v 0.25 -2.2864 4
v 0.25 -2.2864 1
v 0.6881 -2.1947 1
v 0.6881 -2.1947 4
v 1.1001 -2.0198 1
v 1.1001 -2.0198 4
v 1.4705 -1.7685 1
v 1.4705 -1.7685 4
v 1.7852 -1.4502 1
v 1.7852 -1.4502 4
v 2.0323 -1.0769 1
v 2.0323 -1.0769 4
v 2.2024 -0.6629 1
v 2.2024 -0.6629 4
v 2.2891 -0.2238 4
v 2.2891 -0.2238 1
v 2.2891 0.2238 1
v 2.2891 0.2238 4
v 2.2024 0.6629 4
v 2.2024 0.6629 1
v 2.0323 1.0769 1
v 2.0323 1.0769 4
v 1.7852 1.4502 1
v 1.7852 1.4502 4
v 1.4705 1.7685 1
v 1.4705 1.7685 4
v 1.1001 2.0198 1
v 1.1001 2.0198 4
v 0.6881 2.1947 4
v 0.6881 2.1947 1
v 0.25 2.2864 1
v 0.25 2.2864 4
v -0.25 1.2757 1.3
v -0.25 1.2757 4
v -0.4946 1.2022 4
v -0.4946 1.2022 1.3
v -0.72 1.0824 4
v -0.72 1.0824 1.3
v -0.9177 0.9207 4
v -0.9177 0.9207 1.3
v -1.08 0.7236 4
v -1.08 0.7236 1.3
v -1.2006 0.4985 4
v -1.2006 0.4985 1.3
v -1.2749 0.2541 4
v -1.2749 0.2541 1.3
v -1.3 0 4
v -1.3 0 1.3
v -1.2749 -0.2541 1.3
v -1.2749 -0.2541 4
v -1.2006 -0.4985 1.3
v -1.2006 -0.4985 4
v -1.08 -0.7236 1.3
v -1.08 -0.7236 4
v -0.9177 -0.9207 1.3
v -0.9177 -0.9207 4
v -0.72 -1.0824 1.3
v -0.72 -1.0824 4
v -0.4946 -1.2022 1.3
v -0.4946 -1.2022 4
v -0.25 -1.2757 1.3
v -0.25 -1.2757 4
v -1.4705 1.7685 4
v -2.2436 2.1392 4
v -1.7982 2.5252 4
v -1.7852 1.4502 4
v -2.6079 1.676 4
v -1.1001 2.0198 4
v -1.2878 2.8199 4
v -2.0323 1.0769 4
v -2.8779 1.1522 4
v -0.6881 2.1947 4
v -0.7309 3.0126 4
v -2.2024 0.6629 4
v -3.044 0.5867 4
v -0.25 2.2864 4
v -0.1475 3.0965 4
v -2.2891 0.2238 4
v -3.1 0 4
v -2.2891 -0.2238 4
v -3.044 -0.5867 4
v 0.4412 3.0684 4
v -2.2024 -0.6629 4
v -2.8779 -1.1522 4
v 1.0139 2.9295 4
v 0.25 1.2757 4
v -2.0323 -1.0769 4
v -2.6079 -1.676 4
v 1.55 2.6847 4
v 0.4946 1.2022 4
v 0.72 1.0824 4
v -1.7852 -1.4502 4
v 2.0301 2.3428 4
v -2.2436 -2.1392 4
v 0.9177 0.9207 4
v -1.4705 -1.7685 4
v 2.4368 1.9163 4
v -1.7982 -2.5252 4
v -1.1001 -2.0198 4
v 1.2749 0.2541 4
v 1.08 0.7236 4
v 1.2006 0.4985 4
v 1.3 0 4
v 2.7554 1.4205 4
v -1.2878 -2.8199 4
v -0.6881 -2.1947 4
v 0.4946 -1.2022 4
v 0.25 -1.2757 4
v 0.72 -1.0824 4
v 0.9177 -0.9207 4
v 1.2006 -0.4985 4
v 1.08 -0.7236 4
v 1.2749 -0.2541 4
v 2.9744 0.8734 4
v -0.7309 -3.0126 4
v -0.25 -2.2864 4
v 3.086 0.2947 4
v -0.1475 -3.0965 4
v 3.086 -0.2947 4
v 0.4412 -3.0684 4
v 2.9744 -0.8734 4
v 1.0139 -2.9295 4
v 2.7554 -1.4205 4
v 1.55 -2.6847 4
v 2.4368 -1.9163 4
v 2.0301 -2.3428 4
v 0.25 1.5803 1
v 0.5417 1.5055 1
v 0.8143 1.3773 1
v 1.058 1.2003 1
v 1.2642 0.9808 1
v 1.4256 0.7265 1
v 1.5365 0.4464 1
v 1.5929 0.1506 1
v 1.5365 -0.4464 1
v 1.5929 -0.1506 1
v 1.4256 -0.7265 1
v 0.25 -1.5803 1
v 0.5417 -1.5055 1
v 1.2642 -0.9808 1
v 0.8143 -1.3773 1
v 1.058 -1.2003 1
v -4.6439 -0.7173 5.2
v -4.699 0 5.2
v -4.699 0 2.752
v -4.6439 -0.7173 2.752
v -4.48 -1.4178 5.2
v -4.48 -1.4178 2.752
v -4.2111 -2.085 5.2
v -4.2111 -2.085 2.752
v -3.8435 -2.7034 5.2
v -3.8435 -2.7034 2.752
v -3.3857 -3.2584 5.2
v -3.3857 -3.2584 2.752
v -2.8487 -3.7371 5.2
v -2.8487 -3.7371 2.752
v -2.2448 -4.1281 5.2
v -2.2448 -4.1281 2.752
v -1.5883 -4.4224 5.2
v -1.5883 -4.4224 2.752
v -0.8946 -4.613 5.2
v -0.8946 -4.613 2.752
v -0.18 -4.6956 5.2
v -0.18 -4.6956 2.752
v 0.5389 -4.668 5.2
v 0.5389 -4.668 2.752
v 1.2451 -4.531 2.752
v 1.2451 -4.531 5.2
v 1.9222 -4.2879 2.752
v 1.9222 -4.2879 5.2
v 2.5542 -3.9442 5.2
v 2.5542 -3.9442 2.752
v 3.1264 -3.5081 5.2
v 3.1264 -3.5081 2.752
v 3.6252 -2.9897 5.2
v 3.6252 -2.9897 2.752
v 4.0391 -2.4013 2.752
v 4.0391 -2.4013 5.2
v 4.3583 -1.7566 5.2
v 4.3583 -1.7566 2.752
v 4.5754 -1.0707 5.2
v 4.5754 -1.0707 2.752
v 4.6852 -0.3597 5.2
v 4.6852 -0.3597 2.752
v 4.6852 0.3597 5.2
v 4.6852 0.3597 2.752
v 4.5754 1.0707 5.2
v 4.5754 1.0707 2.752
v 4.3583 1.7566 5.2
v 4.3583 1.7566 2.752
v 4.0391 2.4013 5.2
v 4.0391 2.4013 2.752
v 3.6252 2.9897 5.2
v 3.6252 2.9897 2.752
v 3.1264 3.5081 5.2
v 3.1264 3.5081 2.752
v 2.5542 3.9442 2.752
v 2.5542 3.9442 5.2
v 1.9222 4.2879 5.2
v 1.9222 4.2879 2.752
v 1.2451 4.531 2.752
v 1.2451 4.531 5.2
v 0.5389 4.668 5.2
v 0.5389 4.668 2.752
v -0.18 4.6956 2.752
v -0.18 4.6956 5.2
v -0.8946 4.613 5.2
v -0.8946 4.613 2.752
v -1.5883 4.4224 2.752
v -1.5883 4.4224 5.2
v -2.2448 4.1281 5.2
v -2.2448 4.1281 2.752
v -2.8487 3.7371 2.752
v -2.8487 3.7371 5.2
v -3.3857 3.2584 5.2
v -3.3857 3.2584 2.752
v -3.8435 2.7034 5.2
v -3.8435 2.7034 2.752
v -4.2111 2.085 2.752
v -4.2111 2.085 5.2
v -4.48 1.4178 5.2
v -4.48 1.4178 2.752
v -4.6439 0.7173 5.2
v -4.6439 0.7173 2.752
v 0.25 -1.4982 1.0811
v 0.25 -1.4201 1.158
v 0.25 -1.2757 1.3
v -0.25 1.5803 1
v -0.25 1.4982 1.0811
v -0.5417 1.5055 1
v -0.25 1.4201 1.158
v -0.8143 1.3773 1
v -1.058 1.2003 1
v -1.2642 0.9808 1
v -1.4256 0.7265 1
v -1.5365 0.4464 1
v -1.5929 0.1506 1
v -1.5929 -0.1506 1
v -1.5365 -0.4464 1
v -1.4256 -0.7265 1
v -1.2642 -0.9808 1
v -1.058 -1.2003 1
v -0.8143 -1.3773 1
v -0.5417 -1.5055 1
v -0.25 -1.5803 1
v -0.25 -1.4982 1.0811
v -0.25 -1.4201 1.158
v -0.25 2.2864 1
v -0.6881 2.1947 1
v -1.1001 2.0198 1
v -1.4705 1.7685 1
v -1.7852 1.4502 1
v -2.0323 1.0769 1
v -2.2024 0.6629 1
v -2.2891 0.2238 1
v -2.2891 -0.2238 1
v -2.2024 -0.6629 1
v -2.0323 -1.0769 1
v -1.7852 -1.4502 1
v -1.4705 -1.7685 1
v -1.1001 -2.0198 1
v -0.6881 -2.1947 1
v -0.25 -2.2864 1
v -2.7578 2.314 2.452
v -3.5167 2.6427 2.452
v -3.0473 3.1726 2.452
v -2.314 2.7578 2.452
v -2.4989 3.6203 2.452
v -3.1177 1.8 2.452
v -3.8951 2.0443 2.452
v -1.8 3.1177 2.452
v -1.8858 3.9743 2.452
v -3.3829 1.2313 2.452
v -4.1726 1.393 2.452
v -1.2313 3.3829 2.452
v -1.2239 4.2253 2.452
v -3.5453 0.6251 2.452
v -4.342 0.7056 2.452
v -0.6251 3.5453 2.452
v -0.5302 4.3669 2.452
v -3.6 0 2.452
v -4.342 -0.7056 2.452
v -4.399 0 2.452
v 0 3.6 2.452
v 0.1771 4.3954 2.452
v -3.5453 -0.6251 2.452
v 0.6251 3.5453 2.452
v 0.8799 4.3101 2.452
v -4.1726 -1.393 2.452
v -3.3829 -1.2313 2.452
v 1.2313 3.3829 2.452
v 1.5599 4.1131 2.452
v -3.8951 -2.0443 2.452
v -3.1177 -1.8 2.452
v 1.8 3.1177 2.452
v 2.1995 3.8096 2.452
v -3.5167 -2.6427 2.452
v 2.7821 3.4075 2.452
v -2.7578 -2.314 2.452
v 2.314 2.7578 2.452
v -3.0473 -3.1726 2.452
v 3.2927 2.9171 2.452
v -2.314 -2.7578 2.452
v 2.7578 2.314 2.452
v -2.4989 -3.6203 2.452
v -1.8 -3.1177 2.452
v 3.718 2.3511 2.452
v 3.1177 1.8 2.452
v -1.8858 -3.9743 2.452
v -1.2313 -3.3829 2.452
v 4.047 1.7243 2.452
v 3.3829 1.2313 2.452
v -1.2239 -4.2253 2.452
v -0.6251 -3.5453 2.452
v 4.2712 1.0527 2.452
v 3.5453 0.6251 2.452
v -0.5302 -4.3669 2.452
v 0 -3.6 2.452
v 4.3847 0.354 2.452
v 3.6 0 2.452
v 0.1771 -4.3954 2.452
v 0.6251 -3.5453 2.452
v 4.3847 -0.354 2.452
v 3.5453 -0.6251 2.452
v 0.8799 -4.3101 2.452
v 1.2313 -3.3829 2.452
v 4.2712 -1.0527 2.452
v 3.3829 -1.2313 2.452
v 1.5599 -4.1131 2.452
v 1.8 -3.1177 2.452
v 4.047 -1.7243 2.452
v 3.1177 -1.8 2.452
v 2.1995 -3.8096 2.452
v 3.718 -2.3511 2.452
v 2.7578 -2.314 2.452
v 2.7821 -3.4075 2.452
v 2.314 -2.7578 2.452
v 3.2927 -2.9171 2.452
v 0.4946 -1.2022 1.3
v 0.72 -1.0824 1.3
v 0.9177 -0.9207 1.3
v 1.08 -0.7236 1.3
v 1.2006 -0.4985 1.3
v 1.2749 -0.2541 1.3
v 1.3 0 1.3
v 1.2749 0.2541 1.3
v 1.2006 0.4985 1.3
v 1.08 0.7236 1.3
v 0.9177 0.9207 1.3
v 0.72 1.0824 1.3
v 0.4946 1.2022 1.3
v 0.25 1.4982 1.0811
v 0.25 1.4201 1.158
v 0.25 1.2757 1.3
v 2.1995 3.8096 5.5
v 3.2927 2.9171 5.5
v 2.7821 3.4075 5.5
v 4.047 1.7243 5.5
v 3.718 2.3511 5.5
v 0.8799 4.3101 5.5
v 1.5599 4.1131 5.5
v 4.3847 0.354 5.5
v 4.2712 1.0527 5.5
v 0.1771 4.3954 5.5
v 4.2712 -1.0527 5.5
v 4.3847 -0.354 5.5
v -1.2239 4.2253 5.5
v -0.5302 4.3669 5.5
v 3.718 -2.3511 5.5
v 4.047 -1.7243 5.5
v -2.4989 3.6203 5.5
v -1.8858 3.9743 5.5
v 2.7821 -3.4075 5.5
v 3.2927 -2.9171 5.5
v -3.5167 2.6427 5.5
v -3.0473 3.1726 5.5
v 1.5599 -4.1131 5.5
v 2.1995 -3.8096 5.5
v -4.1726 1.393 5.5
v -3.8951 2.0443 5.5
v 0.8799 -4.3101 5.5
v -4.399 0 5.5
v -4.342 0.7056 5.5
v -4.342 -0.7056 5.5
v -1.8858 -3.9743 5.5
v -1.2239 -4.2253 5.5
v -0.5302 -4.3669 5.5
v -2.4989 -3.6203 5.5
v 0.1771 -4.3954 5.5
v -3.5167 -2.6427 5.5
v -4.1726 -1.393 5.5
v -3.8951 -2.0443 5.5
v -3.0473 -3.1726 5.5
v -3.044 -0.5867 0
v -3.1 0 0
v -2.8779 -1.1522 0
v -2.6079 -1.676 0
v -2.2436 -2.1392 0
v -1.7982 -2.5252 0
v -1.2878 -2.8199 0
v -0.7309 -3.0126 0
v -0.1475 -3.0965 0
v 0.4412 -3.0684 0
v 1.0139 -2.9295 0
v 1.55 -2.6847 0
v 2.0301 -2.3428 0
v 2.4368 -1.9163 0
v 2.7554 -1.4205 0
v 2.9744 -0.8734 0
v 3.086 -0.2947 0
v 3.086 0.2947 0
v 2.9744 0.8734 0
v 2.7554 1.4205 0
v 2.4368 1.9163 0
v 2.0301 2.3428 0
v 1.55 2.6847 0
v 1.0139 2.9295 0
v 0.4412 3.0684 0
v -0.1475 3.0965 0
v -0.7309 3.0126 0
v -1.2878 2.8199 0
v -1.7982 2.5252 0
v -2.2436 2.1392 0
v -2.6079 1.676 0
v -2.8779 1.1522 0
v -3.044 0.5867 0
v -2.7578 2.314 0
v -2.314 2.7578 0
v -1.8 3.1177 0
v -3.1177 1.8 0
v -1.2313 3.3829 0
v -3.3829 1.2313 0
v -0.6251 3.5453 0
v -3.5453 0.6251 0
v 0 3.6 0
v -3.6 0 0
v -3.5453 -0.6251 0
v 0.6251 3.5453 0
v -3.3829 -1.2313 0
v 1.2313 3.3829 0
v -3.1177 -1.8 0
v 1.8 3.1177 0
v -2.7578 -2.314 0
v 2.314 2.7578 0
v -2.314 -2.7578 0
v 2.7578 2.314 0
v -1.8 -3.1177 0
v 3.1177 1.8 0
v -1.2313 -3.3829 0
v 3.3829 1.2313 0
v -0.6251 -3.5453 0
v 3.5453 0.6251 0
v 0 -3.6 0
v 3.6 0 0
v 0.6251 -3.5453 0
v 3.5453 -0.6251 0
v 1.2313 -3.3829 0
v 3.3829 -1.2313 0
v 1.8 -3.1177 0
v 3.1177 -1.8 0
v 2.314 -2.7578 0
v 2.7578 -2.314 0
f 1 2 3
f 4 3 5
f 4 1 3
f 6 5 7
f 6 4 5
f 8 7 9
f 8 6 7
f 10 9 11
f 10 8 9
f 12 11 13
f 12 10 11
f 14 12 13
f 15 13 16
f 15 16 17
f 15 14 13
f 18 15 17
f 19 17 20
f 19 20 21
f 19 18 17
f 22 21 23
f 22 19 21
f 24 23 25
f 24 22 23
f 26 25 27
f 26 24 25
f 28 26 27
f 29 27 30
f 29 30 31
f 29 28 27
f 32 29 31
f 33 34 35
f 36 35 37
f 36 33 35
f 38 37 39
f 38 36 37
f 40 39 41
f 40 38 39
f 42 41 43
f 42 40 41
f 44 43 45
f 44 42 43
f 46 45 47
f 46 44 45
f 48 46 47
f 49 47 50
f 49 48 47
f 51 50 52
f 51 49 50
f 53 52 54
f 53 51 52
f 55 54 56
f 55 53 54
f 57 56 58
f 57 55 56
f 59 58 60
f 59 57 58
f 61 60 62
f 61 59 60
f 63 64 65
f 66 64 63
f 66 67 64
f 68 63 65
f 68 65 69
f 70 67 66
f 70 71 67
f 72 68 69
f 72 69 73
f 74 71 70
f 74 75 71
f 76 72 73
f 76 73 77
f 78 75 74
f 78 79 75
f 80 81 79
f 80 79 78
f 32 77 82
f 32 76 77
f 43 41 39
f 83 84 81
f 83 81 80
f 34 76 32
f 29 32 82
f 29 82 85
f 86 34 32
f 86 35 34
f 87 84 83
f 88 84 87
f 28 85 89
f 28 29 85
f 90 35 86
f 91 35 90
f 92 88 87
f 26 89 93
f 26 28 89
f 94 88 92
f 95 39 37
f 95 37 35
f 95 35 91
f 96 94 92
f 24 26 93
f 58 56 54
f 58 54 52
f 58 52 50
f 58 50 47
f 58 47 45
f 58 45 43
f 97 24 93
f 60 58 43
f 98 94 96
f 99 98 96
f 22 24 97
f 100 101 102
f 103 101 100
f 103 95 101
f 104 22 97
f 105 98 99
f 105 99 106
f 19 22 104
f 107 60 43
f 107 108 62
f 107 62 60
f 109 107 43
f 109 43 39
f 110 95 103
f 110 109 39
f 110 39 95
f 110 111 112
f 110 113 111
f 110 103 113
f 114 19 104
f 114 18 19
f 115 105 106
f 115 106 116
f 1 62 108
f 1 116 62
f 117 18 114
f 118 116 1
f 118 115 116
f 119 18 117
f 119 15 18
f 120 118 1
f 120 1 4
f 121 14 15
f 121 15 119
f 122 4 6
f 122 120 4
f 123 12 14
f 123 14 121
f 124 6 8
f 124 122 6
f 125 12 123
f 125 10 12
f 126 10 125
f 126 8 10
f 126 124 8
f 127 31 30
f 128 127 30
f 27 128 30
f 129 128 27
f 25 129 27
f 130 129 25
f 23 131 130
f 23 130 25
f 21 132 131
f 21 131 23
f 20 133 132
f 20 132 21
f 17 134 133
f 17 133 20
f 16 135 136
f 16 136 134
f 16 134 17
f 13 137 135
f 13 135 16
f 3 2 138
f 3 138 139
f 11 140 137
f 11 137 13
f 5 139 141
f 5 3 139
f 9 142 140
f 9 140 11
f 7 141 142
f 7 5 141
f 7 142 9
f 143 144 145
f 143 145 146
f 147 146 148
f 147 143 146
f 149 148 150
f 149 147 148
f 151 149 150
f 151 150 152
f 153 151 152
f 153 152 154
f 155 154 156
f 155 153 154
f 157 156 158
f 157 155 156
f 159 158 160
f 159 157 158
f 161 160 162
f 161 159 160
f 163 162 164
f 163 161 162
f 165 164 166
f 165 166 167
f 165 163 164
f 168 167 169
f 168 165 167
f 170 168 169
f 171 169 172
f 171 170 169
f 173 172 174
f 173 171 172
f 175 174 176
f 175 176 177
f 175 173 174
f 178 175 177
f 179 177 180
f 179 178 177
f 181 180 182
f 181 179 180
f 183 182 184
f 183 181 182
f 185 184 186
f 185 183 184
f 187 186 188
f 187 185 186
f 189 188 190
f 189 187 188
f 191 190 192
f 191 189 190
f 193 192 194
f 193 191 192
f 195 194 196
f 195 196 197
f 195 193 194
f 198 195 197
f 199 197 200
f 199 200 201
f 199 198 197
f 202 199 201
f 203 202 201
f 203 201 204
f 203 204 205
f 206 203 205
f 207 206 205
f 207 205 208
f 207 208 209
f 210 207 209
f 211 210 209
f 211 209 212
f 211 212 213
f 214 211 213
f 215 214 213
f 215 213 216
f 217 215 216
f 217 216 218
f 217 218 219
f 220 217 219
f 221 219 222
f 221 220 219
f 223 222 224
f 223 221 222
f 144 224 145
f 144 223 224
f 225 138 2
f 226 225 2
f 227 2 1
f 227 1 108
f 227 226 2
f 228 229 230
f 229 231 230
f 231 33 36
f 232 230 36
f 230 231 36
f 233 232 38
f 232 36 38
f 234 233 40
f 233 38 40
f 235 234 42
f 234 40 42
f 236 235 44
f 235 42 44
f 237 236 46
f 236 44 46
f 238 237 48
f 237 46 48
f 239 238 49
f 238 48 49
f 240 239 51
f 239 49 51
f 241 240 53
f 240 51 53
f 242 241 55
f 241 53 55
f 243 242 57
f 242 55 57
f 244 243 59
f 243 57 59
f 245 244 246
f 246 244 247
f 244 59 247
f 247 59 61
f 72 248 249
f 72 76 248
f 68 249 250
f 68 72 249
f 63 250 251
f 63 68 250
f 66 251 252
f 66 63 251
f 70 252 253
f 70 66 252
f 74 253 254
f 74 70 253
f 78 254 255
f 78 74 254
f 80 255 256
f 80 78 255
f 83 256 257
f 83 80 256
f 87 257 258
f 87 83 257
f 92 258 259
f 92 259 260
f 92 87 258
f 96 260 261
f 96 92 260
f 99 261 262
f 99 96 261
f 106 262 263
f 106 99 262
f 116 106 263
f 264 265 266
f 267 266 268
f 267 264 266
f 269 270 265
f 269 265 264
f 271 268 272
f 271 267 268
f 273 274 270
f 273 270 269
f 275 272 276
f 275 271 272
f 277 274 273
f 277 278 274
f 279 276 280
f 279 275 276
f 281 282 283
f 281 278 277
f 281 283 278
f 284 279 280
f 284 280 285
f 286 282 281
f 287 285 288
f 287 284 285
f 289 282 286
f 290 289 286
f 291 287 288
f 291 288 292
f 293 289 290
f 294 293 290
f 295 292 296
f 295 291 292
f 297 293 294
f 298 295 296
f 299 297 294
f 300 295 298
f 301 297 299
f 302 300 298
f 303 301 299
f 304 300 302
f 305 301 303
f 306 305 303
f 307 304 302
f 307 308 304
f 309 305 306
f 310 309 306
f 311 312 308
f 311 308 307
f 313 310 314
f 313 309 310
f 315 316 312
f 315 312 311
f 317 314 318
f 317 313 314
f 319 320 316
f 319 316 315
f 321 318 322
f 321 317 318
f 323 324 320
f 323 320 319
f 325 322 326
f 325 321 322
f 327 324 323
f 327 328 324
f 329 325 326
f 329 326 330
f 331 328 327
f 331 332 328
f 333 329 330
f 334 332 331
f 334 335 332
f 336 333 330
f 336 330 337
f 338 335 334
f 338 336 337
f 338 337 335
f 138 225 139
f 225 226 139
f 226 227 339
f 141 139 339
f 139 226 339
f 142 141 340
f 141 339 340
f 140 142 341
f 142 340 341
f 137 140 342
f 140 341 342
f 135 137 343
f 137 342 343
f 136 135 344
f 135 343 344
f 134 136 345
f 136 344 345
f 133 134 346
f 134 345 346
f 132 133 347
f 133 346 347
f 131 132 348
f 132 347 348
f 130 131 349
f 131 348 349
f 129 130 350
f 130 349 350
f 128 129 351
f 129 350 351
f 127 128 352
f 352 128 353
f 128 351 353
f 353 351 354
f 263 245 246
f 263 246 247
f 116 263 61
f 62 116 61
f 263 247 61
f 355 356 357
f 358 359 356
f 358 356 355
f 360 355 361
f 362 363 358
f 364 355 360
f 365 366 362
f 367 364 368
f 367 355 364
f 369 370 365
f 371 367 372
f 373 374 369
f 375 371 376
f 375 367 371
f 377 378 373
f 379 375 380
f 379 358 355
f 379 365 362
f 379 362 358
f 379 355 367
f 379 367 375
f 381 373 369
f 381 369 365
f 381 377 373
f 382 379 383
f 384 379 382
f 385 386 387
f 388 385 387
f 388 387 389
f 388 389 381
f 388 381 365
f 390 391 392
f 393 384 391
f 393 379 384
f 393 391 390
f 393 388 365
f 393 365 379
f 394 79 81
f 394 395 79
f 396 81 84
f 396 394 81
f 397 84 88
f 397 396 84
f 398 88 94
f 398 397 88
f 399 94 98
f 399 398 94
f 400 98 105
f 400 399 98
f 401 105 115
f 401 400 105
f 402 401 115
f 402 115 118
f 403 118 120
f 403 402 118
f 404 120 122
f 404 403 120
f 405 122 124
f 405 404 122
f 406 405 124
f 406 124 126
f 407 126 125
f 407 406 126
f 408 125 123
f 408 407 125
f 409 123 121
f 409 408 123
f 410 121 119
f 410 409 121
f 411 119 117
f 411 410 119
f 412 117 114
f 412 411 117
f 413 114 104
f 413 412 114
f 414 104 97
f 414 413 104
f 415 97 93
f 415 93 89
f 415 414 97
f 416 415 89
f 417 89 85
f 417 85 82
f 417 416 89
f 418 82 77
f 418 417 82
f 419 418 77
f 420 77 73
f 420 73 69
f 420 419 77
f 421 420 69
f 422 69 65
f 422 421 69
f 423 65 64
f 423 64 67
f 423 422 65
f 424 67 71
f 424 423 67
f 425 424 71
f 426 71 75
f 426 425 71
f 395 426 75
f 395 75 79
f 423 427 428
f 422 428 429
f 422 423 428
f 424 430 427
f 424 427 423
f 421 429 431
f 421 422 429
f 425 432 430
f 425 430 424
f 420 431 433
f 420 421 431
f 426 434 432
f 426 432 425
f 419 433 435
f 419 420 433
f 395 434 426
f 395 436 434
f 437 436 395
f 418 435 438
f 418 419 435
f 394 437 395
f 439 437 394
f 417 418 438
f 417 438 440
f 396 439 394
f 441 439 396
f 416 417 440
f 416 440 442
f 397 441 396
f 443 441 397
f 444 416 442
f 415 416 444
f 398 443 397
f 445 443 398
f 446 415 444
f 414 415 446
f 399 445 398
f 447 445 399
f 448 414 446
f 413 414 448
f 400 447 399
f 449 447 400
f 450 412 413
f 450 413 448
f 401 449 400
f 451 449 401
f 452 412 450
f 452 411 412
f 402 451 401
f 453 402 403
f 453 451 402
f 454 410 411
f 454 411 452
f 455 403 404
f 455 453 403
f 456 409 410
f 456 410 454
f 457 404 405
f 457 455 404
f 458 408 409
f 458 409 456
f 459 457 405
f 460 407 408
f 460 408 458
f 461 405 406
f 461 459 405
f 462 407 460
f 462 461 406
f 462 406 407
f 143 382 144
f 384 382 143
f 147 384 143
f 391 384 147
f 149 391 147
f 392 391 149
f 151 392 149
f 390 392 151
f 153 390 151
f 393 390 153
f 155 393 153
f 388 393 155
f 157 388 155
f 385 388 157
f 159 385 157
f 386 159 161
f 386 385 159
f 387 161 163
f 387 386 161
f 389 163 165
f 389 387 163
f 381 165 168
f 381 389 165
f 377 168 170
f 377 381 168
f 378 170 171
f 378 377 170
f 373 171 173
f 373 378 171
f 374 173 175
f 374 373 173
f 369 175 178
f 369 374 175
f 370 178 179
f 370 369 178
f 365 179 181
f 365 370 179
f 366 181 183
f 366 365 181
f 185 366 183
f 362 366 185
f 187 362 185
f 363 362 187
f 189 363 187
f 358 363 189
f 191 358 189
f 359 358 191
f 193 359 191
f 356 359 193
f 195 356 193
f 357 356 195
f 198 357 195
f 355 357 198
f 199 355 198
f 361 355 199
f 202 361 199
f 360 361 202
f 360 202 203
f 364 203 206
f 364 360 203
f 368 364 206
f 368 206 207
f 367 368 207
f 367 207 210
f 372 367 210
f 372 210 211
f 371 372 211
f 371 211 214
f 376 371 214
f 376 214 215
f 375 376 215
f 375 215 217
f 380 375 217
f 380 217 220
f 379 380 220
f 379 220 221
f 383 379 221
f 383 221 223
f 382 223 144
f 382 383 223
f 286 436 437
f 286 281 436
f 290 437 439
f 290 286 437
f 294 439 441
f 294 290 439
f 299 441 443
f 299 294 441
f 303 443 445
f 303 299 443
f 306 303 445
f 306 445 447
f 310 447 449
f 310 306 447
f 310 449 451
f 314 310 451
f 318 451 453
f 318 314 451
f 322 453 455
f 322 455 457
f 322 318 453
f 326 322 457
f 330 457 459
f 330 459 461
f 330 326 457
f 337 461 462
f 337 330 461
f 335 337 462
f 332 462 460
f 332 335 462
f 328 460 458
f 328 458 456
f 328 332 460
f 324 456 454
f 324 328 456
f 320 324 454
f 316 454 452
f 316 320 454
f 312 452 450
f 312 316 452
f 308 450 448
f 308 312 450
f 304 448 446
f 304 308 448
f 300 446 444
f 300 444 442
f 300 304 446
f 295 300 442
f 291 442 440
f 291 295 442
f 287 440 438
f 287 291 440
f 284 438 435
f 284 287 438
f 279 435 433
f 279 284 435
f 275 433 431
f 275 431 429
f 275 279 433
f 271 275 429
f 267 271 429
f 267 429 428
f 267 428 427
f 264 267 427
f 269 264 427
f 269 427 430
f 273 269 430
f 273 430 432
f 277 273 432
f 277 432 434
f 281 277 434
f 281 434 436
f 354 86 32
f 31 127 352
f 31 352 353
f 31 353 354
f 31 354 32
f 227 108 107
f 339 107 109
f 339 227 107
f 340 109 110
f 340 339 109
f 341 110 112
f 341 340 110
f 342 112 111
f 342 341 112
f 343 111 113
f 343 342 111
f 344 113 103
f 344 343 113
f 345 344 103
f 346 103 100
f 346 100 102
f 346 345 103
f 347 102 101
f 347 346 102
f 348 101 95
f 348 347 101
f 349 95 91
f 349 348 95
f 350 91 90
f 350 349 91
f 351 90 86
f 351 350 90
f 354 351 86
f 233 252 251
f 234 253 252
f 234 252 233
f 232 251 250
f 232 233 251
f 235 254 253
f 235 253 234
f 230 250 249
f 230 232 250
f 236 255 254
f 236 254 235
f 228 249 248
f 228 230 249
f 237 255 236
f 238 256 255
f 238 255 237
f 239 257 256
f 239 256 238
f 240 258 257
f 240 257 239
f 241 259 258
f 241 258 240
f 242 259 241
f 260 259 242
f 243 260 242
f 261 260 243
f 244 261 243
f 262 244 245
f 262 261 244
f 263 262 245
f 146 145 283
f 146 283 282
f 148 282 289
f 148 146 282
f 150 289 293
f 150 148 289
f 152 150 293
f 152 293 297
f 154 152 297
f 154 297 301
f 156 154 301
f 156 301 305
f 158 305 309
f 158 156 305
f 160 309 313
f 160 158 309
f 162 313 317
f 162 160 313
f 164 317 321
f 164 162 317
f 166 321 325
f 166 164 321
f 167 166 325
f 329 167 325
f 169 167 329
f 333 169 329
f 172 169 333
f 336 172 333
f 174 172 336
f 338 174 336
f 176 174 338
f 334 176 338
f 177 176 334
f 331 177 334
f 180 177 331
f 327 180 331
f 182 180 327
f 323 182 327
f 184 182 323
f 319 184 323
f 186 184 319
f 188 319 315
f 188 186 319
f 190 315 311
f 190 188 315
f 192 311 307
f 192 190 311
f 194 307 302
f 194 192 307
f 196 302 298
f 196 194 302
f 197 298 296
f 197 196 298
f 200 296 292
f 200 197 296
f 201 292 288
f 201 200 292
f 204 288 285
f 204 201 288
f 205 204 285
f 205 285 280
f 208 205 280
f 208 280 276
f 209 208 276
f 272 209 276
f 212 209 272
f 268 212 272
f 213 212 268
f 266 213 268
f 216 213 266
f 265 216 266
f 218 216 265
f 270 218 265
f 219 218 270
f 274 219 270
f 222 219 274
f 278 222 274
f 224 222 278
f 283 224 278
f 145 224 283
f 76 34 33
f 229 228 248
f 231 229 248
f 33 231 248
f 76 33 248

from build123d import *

# Parameters (mm, degrees)
SKETCH010_W     = 0.5
SKETCH010_H     = 5
POCKET001_DEPTH = 4
CHAMFER_SIZE    = 0.3


with BuildPart() as part:
    # Sketch008 → Revolution002 (revolve)
    with BuildSketch(Plane.XZ):
        Polygon((-3.6, 0), (-3.6, 2.452), (-4.699, 2.452), (-4.699, 5.5), (0, 5.5), (0, 4), (-1.3, 4), (-1.3, 1), (-2.3, 1), (-2.3, 4), (-3.1, 4), (-3.1, 0), align=None)
    revolve(axis=Axis((0, 0, 0), (0, 0, 1)))

    # Sketch010 → Pocket001 (cut)
    with BuildSketch(Plane.XY):
        Rectangle(SKETCH010_W, SKETCH010_H)
    extrude(amount=POCKET001_DEPTH, mode=Mode.SUBTRACT)

    # Chamfer
    chamfer_edges = [part.edges().sort_by_distance(p)[0] for p in [
        (4.699, 0, 5.5),
        (4.699, 0, 2.452),
        (1.3, 0, 1),
        (-1.003743, 0.826136, 1),
    ]]
    chamfer(chamfer_edges, length=CHAMFER_SIZE)


solid = part.part
